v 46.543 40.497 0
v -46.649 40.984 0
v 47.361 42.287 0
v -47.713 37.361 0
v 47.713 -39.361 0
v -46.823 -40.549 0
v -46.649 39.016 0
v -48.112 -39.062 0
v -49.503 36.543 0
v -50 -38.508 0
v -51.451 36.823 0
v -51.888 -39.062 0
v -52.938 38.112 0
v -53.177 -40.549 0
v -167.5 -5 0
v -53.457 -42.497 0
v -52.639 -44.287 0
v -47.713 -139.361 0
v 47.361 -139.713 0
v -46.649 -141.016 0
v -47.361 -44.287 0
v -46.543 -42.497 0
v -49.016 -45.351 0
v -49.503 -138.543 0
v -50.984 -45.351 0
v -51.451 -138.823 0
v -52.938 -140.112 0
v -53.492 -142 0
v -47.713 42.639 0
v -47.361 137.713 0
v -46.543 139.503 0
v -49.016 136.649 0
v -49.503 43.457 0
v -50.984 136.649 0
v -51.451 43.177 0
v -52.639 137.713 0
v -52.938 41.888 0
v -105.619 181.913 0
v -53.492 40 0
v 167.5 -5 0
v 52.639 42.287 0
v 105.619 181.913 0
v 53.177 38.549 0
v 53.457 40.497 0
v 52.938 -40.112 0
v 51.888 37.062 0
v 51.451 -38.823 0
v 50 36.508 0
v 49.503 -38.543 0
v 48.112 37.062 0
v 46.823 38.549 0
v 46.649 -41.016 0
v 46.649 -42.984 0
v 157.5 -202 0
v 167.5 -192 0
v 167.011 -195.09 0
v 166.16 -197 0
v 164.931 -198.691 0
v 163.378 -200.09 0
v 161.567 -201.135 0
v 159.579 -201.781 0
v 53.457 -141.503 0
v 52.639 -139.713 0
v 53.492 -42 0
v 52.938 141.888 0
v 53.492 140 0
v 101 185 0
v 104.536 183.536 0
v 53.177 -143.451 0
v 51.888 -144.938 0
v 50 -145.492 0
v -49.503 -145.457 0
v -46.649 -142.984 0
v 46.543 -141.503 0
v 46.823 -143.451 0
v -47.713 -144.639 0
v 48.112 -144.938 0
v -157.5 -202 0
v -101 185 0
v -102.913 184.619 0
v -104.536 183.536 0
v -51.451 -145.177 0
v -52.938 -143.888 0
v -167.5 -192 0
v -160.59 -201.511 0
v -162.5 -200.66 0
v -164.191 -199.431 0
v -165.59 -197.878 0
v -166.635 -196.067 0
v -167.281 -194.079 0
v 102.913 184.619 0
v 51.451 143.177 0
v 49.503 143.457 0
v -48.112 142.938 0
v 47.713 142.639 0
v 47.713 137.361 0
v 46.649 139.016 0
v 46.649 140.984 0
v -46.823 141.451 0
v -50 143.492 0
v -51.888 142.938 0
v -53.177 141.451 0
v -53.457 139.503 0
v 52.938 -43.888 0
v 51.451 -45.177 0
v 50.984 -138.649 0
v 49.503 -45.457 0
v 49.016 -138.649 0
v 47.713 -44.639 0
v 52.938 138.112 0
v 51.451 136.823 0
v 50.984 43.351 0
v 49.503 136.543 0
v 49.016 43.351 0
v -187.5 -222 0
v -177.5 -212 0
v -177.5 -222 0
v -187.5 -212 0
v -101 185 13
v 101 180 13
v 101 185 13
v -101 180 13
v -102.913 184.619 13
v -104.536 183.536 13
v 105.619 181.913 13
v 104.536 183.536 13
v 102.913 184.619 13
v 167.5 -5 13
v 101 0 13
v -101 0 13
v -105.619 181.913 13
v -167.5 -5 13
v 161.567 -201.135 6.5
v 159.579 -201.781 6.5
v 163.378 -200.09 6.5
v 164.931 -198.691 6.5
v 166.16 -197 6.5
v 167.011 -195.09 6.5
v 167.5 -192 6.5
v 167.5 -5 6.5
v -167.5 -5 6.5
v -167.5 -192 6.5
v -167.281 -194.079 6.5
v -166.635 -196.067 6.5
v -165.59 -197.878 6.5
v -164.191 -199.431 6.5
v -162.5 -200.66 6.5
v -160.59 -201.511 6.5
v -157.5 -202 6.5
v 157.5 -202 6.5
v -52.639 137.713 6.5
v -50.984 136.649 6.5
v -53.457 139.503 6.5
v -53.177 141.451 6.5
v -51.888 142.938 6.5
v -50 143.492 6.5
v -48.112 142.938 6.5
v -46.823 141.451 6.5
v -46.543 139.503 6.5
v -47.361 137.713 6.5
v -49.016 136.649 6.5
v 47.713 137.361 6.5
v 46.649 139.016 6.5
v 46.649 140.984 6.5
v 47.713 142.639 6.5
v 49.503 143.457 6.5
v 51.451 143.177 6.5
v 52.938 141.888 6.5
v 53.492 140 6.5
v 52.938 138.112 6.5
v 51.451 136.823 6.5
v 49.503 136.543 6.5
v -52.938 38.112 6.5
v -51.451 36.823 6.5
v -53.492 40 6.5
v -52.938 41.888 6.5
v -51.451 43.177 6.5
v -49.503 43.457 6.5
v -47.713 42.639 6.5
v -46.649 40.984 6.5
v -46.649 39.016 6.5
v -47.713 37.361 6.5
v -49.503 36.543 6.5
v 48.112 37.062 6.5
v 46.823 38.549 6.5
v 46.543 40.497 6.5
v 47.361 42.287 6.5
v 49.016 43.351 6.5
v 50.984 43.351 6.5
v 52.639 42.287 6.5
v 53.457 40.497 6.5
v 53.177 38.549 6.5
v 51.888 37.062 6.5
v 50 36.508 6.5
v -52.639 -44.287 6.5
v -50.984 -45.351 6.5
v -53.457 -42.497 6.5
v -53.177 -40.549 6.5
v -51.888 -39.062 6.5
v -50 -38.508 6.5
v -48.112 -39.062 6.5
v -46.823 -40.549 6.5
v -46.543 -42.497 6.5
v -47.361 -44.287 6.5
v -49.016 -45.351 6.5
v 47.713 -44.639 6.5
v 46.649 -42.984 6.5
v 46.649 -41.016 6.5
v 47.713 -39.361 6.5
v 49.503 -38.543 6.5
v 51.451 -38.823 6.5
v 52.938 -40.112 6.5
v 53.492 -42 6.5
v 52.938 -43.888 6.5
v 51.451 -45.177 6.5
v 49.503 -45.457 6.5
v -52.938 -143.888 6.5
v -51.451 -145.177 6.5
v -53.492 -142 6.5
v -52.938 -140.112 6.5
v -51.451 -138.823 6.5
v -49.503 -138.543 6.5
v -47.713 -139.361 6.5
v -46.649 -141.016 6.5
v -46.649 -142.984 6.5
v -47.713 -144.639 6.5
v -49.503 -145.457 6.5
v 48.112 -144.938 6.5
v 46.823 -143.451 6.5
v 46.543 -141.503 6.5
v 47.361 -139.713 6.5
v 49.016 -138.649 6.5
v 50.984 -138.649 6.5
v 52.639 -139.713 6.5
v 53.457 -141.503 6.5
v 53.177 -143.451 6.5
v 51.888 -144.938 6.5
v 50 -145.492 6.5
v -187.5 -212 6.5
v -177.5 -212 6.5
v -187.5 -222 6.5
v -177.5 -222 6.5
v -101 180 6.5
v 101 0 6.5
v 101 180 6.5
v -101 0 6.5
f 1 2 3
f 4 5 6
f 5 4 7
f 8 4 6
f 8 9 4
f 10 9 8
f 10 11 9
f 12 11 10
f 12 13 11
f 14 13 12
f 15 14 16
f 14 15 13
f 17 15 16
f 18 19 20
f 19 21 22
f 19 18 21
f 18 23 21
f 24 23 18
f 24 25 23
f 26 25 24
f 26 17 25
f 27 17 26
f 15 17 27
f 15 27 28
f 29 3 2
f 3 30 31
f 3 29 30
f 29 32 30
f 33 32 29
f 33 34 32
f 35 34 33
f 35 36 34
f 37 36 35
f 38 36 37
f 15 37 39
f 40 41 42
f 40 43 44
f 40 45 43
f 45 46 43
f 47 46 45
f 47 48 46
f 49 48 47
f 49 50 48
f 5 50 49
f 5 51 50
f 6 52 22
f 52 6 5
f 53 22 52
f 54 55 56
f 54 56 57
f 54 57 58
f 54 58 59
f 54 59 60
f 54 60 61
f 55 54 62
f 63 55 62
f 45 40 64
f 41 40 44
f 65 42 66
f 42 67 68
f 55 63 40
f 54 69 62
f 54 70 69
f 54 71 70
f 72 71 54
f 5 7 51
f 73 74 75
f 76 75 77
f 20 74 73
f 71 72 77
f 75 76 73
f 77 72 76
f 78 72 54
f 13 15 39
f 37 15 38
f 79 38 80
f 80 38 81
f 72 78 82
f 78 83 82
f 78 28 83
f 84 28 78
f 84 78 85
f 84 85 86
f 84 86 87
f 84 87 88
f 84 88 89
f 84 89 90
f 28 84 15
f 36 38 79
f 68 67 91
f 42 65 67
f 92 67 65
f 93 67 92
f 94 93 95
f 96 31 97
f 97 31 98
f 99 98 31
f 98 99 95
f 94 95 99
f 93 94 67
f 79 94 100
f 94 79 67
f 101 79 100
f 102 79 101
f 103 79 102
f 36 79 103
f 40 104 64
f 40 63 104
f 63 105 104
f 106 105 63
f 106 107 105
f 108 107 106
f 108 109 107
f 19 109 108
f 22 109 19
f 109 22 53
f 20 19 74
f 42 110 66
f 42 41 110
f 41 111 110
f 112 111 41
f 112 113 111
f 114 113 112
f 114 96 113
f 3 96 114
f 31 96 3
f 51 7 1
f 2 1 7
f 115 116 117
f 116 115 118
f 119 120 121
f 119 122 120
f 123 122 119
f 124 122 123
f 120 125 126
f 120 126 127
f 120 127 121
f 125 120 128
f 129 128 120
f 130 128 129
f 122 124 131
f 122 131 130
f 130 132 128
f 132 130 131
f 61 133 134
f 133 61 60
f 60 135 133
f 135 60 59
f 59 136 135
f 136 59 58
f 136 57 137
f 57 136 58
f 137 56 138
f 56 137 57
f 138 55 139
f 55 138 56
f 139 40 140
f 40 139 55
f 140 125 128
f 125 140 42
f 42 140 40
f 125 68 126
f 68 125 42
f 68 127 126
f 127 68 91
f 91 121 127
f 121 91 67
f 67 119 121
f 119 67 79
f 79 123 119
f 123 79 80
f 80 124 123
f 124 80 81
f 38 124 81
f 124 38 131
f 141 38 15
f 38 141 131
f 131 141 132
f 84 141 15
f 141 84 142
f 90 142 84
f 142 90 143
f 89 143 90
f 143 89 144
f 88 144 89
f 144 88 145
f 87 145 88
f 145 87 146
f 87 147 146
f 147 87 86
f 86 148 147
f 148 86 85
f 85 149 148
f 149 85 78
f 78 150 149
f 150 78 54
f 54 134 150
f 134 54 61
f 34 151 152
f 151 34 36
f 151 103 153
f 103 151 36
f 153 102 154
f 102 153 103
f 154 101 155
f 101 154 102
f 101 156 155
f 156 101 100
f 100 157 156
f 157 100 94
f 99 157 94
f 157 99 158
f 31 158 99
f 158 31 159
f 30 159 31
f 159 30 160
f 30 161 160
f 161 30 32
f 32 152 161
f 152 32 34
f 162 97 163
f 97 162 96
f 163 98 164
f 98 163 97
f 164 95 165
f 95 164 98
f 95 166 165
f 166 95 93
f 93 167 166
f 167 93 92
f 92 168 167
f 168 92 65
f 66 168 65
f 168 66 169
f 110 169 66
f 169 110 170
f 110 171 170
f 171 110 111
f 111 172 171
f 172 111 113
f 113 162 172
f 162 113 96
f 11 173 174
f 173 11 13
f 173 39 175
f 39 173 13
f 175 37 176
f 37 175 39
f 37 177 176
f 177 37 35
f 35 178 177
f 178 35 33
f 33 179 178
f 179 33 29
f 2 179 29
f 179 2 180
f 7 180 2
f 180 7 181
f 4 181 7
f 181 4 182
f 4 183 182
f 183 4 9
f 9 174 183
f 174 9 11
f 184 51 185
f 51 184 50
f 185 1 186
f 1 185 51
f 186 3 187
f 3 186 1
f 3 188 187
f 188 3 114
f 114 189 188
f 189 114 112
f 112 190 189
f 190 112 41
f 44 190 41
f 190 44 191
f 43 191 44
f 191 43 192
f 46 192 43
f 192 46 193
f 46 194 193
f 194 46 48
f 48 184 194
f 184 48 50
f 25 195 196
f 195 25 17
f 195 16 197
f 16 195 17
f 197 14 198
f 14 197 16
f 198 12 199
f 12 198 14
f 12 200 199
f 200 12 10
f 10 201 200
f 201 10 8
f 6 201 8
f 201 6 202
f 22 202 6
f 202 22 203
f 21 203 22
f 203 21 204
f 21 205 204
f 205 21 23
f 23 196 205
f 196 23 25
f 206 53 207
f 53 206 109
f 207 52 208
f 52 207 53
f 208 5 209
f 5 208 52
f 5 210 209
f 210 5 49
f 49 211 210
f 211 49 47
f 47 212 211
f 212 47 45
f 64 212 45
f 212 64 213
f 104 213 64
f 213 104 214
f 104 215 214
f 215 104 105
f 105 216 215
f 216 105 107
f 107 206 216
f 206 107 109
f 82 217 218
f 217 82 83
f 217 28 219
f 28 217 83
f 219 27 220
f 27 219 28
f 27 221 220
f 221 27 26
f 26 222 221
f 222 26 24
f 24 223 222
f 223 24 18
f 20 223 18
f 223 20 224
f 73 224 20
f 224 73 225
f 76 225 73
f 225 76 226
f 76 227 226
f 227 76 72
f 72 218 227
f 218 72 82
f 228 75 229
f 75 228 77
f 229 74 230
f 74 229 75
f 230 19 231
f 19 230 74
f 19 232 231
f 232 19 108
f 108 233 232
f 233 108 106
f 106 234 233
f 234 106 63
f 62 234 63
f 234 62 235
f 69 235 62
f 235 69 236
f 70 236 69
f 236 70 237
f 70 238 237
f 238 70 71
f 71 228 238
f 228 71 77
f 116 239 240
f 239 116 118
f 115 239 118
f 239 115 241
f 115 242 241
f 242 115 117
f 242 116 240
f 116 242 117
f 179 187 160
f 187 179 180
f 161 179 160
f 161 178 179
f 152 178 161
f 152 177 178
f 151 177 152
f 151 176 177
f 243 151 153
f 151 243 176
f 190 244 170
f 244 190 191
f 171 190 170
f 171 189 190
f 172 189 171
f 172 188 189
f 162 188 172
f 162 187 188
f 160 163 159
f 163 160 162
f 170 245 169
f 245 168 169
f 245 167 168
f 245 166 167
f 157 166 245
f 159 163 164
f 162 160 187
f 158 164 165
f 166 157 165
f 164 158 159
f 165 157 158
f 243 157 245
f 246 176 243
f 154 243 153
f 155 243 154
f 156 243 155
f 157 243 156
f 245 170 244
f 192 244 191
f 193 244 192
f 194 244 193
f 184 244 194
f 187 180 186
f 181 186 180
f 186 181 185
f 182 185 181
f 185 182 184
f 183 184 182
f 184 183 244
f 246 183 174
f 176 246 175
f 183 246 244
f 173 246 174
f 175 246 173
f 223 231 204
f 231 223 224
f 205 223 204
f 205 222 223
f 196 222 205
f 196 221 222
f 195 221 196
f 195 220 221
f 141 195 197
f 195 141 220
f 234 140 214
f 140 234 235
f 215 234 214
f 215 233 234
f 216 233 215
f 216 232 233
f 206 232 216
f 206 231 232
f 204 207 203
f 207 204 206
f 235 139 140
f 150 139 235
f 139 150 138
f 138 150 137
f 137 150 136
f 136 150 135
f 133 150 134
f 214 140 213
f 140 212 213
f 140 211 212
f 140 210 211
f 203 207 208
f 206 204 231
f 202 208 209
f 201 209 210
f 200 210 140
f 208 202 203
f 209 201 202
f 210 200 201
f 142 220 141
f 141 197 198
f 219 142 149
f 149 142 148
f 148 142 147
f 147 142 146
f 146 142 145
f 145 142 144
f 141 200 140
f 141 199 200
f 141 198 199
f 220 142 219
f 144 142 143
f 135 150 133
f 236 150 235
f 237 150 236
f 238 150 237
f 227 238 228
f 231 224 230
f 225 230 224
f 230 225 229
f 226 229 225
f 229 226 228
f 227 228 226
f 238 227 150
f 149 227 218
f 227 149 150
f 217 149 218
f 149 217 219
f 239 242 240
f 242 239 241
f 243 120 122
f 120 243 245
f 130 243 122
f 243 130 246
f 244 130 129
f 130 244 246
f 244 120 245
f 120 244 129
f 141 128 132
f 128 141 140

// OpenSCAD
dock_x=202;
dock_y=180;

laptop_x=335;
laptop_y=232;
laptop_corner=10;

dock_overlap=30;

lip=5;

wood=13;
base=wood/2;
pad=0.1;

vesa_sizes=[100];
mountpoints=[140-laptop_y,dock_y/2];

in=25.4;
bit=in/4;
screw=bit*1.1;
pocket_overhang=bit;

module laptop() {
	translate([-laptop_x/2,dock_overlap-laptop_y])
	offset(laptop_corner)
	offset(-laptop_corner)
	square([laptop_x,laptop_y]);
}

module vesa() {
	for(mountpoint=mountpoints)
	translate([0,mountpoint])
	for(vesa=vesa_sizes)
	for(r=[0:90:359])
	rotate([0,0,r])
	translate([vesa/2,vesa/2])
	circle(d=screw);	
}

module dock() {
	translate([-dock_x/2,0])
	square([dock_x,dock_y]);
}

module body() {
	hull() {
		laptop_overhang();
		offset(lip)
		dock();
	}
}

module laptop_overhang(extra=0) {
	difference() {
		offset(extra)
		laptop();
		translate([-laptop_x/2-pad*2-extra,-lip])
		square([laptop_x+pad*4+extra*2,laptop_y]);
	}
}


module assembled() {
	difference() {
		linear_extrude(height=wood)
		outside_profile();

		translate([0,0,base])
		linear_extrude(height=wood)
		pockets();
	}
}

// RENDER svg
module outside_profile() {
	difference() {
		body();
		vesa();
	}
	anchor();
}

// RENDER svg
module pockets() {
	dock();
	laptop_overhang(pocket_overhang);
	anchor();
}

anchor=10;
anchor_x=-laptop_x/2-anchor*2;
anchor_y=-laptop_y+dock_overlap-anchor*2;

preview_height=1;

module preview() {
	color("red")
	linear_extrude(height=preview_height)
	outside_profile();

	color("blue")
	translate([0,0,1])
	linear_extrude(height=preview_height)
	pockets();
}

//preview();
assembled();

module anchor() {
	color("lime")
	translate([anchor_x,anchor_y])
	square([anchor, anchor]);
}
